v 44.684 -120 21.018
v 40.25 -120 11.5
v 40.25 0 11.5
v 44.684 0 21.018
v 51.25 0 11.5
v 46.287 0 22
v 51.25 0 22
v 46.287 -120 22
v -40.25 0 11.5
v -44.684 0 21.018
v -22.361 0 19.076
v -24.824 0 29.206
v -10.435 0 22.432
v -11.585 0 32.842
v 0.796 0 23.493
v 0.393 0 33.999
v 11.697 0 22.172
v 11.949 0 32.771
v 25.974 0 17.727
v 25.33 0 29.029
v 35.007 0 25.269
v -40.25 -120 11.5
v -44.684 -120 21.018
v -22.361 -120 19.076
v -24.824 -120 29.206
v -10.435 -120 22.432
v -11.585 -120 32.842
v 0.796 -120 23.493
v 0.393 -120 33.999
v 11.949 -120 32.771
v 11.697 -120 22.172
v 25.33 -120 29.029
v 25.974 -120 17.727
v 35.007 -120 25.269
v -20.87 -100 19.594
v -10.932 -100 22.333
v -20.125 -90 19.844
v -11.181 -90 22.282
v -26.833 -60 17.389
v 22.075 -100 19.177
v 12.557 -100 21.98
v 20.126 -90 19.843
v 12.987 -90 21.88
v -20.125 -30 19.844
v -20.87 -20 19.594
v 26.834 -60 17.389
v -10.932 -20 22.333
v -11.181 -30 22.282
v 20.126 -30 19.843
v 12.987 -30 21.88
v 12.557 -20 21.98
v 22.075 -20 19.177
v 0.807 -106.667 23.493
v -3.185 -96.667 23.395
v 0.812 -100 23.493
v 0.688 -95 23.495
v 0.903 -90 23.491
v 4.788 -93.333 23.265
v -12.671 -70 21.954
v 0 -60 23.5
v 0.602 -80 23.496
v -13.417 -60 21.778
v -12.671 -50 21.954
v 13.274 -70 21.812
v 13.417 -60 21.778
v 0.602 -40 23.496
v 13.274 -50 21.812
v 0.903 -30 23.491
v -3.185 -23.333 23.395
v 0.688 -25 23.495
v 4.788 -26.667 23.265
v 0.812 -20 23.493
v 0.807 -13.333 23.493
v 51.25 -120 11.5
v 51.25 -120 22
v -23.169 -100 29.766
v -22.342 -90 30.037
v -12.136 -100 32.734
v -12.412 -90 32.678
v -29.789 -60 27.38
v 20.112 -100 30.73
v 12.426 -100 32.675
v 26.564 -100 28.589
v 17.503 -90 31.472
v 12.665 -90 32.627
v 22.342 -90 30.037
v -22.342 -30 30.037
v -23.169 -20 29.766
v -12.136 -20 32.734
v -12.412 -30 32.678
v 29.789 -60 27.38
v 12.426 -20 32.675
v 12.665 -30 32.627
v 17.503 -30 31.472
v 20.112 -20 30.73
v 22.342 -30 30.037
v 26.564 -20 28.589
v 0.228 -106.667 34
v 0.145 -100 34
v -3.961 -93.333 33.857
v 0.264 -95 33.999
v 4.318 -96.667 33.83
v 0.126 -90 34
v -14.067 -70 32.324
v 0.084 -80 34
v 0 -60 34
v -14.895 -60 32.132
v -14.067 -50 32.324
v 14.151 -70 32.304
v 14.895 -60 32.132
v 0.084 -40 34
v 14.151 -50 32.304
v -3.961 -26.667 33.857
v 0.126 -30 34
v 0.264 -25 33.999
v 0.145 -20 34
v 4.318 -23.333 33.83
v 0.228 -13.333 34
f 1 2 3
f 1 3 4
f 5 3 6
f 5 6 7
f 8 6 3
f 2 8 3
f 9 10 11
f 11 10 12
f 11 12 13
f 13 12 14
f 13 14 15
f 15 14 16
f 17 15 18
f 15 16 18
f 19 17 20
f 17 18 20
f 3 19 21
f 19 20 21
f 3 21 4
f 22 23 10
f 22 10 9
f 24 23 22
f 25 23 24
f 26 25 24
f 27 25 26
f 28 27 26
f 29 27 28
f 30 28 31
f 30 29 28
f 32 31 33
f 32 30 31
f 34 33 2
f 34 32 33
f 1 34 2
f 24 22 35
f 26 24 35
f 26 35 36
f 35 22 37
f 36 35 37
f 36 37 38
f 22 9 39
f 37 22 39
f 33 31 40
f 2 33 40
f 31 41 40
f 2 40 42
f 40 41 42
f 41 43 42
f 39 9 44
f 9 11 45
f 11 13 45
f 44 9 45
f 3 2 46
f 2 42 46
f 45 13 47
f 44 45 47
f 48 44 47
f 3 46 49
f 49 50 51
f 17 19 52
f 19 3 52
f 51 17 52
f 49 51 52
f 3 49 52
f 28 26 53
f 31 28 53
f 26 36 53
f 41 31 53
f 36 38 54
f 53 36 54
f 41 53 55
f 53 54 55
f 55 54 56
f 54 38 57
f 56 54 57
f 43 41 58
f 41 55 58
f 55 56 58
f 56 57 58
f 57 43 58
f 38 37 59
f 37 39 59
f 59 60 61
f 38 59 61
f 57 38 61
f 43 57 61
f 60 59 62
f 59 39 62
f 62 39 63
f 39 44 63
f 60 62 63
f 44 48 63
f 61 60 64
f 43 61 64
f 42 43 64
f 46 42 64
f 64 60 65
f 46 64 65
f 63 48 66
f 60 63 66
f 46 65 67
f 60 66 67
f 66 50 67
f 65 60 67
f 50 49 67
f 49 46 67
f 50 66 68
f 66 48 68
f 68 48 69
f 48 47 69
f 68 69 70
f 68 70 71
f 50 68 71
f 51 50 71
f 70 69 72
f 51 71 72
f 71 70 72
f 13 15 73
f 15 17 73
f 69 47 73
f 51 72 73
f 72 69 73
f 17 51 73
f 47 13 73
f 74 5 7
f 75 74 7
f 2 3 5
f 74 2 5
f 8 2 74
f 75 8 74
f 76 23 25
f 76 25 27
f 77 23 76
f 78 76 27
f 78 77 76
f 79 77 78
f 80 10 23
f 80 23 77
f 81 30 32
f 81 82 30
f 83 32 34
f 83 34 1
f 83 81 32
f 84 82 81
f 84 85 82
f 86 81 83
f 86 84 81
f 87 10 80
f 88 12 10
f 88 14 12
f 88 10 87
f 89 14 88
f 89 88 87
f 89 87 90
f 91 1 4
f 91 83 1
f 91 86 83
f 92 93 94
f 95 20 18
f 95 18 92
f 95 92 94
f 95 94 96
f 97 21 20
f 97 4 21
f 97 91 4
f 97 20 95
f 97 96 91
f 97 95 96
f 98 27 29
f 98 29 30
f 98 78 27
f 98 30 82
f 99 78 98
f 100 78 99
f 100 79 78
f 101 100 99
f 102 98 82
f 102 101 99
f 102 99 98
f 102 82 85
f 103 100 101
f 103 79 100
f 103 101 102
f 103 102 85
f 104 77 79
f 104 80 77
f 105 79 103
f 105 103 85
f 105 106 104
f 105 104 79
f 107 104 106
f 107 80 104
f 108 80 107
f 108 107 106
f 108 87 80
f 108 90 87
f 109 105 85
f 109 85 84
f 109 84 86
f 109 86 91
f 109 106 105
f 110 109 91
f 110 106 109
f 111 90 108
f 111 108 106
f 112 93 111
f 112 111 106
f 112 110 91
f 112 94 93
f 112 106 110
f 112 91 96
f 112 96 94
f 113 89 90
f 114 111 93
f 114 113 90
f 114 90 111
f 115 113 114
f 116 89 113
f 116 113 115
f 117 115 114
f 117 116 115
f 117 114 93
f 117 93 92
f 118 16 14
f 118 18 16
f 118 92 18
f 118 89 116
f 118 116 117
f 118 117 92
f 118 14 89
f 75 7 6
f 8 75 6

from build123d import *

# Parameters (mm, degrees)
F1_DEPTH = 120


with BuildPart() as f1:
    # F0 (on Front) → F1 (new body)
    with BuildSketch(Plane.XZ):
        with BuildLine():
            Line((-44.683824, 21.017941), (-40.25, 11.5))
            add(Edge.make_bspline(
                [(-40.25, 11.5), (-26.833333, 17.75), (-0.000677, 29.250315), (26.834688, 17.749369), (40.25, 11.5)],
                knots=[0, 0, 0, 0, 42.000744, 84.001488, 84.001488, 84.001488, 84.001488], degree=3))
            Line((40.25, 11.5), (44.683824, 21.017941))
            add(Edge.make_bspline(
                [(-44.683824, 21.017941), (-29.789216, 27.758971), (0, 40.241029), (29.789216, 27.758971), (44.683824, 21.017941)],
                knots=[0, 0, 0, 0, 46.531473, 93.062945, 93.062945, 93.062945, 93.062945], degree=3))
        make_face()
        Polygon((46.286553, 22), (40.25, 11.5), (51.25, 11.5), (51.25, 22), align=None)
    extrude(amount=F1_DEPTH)


solid = f1.part
